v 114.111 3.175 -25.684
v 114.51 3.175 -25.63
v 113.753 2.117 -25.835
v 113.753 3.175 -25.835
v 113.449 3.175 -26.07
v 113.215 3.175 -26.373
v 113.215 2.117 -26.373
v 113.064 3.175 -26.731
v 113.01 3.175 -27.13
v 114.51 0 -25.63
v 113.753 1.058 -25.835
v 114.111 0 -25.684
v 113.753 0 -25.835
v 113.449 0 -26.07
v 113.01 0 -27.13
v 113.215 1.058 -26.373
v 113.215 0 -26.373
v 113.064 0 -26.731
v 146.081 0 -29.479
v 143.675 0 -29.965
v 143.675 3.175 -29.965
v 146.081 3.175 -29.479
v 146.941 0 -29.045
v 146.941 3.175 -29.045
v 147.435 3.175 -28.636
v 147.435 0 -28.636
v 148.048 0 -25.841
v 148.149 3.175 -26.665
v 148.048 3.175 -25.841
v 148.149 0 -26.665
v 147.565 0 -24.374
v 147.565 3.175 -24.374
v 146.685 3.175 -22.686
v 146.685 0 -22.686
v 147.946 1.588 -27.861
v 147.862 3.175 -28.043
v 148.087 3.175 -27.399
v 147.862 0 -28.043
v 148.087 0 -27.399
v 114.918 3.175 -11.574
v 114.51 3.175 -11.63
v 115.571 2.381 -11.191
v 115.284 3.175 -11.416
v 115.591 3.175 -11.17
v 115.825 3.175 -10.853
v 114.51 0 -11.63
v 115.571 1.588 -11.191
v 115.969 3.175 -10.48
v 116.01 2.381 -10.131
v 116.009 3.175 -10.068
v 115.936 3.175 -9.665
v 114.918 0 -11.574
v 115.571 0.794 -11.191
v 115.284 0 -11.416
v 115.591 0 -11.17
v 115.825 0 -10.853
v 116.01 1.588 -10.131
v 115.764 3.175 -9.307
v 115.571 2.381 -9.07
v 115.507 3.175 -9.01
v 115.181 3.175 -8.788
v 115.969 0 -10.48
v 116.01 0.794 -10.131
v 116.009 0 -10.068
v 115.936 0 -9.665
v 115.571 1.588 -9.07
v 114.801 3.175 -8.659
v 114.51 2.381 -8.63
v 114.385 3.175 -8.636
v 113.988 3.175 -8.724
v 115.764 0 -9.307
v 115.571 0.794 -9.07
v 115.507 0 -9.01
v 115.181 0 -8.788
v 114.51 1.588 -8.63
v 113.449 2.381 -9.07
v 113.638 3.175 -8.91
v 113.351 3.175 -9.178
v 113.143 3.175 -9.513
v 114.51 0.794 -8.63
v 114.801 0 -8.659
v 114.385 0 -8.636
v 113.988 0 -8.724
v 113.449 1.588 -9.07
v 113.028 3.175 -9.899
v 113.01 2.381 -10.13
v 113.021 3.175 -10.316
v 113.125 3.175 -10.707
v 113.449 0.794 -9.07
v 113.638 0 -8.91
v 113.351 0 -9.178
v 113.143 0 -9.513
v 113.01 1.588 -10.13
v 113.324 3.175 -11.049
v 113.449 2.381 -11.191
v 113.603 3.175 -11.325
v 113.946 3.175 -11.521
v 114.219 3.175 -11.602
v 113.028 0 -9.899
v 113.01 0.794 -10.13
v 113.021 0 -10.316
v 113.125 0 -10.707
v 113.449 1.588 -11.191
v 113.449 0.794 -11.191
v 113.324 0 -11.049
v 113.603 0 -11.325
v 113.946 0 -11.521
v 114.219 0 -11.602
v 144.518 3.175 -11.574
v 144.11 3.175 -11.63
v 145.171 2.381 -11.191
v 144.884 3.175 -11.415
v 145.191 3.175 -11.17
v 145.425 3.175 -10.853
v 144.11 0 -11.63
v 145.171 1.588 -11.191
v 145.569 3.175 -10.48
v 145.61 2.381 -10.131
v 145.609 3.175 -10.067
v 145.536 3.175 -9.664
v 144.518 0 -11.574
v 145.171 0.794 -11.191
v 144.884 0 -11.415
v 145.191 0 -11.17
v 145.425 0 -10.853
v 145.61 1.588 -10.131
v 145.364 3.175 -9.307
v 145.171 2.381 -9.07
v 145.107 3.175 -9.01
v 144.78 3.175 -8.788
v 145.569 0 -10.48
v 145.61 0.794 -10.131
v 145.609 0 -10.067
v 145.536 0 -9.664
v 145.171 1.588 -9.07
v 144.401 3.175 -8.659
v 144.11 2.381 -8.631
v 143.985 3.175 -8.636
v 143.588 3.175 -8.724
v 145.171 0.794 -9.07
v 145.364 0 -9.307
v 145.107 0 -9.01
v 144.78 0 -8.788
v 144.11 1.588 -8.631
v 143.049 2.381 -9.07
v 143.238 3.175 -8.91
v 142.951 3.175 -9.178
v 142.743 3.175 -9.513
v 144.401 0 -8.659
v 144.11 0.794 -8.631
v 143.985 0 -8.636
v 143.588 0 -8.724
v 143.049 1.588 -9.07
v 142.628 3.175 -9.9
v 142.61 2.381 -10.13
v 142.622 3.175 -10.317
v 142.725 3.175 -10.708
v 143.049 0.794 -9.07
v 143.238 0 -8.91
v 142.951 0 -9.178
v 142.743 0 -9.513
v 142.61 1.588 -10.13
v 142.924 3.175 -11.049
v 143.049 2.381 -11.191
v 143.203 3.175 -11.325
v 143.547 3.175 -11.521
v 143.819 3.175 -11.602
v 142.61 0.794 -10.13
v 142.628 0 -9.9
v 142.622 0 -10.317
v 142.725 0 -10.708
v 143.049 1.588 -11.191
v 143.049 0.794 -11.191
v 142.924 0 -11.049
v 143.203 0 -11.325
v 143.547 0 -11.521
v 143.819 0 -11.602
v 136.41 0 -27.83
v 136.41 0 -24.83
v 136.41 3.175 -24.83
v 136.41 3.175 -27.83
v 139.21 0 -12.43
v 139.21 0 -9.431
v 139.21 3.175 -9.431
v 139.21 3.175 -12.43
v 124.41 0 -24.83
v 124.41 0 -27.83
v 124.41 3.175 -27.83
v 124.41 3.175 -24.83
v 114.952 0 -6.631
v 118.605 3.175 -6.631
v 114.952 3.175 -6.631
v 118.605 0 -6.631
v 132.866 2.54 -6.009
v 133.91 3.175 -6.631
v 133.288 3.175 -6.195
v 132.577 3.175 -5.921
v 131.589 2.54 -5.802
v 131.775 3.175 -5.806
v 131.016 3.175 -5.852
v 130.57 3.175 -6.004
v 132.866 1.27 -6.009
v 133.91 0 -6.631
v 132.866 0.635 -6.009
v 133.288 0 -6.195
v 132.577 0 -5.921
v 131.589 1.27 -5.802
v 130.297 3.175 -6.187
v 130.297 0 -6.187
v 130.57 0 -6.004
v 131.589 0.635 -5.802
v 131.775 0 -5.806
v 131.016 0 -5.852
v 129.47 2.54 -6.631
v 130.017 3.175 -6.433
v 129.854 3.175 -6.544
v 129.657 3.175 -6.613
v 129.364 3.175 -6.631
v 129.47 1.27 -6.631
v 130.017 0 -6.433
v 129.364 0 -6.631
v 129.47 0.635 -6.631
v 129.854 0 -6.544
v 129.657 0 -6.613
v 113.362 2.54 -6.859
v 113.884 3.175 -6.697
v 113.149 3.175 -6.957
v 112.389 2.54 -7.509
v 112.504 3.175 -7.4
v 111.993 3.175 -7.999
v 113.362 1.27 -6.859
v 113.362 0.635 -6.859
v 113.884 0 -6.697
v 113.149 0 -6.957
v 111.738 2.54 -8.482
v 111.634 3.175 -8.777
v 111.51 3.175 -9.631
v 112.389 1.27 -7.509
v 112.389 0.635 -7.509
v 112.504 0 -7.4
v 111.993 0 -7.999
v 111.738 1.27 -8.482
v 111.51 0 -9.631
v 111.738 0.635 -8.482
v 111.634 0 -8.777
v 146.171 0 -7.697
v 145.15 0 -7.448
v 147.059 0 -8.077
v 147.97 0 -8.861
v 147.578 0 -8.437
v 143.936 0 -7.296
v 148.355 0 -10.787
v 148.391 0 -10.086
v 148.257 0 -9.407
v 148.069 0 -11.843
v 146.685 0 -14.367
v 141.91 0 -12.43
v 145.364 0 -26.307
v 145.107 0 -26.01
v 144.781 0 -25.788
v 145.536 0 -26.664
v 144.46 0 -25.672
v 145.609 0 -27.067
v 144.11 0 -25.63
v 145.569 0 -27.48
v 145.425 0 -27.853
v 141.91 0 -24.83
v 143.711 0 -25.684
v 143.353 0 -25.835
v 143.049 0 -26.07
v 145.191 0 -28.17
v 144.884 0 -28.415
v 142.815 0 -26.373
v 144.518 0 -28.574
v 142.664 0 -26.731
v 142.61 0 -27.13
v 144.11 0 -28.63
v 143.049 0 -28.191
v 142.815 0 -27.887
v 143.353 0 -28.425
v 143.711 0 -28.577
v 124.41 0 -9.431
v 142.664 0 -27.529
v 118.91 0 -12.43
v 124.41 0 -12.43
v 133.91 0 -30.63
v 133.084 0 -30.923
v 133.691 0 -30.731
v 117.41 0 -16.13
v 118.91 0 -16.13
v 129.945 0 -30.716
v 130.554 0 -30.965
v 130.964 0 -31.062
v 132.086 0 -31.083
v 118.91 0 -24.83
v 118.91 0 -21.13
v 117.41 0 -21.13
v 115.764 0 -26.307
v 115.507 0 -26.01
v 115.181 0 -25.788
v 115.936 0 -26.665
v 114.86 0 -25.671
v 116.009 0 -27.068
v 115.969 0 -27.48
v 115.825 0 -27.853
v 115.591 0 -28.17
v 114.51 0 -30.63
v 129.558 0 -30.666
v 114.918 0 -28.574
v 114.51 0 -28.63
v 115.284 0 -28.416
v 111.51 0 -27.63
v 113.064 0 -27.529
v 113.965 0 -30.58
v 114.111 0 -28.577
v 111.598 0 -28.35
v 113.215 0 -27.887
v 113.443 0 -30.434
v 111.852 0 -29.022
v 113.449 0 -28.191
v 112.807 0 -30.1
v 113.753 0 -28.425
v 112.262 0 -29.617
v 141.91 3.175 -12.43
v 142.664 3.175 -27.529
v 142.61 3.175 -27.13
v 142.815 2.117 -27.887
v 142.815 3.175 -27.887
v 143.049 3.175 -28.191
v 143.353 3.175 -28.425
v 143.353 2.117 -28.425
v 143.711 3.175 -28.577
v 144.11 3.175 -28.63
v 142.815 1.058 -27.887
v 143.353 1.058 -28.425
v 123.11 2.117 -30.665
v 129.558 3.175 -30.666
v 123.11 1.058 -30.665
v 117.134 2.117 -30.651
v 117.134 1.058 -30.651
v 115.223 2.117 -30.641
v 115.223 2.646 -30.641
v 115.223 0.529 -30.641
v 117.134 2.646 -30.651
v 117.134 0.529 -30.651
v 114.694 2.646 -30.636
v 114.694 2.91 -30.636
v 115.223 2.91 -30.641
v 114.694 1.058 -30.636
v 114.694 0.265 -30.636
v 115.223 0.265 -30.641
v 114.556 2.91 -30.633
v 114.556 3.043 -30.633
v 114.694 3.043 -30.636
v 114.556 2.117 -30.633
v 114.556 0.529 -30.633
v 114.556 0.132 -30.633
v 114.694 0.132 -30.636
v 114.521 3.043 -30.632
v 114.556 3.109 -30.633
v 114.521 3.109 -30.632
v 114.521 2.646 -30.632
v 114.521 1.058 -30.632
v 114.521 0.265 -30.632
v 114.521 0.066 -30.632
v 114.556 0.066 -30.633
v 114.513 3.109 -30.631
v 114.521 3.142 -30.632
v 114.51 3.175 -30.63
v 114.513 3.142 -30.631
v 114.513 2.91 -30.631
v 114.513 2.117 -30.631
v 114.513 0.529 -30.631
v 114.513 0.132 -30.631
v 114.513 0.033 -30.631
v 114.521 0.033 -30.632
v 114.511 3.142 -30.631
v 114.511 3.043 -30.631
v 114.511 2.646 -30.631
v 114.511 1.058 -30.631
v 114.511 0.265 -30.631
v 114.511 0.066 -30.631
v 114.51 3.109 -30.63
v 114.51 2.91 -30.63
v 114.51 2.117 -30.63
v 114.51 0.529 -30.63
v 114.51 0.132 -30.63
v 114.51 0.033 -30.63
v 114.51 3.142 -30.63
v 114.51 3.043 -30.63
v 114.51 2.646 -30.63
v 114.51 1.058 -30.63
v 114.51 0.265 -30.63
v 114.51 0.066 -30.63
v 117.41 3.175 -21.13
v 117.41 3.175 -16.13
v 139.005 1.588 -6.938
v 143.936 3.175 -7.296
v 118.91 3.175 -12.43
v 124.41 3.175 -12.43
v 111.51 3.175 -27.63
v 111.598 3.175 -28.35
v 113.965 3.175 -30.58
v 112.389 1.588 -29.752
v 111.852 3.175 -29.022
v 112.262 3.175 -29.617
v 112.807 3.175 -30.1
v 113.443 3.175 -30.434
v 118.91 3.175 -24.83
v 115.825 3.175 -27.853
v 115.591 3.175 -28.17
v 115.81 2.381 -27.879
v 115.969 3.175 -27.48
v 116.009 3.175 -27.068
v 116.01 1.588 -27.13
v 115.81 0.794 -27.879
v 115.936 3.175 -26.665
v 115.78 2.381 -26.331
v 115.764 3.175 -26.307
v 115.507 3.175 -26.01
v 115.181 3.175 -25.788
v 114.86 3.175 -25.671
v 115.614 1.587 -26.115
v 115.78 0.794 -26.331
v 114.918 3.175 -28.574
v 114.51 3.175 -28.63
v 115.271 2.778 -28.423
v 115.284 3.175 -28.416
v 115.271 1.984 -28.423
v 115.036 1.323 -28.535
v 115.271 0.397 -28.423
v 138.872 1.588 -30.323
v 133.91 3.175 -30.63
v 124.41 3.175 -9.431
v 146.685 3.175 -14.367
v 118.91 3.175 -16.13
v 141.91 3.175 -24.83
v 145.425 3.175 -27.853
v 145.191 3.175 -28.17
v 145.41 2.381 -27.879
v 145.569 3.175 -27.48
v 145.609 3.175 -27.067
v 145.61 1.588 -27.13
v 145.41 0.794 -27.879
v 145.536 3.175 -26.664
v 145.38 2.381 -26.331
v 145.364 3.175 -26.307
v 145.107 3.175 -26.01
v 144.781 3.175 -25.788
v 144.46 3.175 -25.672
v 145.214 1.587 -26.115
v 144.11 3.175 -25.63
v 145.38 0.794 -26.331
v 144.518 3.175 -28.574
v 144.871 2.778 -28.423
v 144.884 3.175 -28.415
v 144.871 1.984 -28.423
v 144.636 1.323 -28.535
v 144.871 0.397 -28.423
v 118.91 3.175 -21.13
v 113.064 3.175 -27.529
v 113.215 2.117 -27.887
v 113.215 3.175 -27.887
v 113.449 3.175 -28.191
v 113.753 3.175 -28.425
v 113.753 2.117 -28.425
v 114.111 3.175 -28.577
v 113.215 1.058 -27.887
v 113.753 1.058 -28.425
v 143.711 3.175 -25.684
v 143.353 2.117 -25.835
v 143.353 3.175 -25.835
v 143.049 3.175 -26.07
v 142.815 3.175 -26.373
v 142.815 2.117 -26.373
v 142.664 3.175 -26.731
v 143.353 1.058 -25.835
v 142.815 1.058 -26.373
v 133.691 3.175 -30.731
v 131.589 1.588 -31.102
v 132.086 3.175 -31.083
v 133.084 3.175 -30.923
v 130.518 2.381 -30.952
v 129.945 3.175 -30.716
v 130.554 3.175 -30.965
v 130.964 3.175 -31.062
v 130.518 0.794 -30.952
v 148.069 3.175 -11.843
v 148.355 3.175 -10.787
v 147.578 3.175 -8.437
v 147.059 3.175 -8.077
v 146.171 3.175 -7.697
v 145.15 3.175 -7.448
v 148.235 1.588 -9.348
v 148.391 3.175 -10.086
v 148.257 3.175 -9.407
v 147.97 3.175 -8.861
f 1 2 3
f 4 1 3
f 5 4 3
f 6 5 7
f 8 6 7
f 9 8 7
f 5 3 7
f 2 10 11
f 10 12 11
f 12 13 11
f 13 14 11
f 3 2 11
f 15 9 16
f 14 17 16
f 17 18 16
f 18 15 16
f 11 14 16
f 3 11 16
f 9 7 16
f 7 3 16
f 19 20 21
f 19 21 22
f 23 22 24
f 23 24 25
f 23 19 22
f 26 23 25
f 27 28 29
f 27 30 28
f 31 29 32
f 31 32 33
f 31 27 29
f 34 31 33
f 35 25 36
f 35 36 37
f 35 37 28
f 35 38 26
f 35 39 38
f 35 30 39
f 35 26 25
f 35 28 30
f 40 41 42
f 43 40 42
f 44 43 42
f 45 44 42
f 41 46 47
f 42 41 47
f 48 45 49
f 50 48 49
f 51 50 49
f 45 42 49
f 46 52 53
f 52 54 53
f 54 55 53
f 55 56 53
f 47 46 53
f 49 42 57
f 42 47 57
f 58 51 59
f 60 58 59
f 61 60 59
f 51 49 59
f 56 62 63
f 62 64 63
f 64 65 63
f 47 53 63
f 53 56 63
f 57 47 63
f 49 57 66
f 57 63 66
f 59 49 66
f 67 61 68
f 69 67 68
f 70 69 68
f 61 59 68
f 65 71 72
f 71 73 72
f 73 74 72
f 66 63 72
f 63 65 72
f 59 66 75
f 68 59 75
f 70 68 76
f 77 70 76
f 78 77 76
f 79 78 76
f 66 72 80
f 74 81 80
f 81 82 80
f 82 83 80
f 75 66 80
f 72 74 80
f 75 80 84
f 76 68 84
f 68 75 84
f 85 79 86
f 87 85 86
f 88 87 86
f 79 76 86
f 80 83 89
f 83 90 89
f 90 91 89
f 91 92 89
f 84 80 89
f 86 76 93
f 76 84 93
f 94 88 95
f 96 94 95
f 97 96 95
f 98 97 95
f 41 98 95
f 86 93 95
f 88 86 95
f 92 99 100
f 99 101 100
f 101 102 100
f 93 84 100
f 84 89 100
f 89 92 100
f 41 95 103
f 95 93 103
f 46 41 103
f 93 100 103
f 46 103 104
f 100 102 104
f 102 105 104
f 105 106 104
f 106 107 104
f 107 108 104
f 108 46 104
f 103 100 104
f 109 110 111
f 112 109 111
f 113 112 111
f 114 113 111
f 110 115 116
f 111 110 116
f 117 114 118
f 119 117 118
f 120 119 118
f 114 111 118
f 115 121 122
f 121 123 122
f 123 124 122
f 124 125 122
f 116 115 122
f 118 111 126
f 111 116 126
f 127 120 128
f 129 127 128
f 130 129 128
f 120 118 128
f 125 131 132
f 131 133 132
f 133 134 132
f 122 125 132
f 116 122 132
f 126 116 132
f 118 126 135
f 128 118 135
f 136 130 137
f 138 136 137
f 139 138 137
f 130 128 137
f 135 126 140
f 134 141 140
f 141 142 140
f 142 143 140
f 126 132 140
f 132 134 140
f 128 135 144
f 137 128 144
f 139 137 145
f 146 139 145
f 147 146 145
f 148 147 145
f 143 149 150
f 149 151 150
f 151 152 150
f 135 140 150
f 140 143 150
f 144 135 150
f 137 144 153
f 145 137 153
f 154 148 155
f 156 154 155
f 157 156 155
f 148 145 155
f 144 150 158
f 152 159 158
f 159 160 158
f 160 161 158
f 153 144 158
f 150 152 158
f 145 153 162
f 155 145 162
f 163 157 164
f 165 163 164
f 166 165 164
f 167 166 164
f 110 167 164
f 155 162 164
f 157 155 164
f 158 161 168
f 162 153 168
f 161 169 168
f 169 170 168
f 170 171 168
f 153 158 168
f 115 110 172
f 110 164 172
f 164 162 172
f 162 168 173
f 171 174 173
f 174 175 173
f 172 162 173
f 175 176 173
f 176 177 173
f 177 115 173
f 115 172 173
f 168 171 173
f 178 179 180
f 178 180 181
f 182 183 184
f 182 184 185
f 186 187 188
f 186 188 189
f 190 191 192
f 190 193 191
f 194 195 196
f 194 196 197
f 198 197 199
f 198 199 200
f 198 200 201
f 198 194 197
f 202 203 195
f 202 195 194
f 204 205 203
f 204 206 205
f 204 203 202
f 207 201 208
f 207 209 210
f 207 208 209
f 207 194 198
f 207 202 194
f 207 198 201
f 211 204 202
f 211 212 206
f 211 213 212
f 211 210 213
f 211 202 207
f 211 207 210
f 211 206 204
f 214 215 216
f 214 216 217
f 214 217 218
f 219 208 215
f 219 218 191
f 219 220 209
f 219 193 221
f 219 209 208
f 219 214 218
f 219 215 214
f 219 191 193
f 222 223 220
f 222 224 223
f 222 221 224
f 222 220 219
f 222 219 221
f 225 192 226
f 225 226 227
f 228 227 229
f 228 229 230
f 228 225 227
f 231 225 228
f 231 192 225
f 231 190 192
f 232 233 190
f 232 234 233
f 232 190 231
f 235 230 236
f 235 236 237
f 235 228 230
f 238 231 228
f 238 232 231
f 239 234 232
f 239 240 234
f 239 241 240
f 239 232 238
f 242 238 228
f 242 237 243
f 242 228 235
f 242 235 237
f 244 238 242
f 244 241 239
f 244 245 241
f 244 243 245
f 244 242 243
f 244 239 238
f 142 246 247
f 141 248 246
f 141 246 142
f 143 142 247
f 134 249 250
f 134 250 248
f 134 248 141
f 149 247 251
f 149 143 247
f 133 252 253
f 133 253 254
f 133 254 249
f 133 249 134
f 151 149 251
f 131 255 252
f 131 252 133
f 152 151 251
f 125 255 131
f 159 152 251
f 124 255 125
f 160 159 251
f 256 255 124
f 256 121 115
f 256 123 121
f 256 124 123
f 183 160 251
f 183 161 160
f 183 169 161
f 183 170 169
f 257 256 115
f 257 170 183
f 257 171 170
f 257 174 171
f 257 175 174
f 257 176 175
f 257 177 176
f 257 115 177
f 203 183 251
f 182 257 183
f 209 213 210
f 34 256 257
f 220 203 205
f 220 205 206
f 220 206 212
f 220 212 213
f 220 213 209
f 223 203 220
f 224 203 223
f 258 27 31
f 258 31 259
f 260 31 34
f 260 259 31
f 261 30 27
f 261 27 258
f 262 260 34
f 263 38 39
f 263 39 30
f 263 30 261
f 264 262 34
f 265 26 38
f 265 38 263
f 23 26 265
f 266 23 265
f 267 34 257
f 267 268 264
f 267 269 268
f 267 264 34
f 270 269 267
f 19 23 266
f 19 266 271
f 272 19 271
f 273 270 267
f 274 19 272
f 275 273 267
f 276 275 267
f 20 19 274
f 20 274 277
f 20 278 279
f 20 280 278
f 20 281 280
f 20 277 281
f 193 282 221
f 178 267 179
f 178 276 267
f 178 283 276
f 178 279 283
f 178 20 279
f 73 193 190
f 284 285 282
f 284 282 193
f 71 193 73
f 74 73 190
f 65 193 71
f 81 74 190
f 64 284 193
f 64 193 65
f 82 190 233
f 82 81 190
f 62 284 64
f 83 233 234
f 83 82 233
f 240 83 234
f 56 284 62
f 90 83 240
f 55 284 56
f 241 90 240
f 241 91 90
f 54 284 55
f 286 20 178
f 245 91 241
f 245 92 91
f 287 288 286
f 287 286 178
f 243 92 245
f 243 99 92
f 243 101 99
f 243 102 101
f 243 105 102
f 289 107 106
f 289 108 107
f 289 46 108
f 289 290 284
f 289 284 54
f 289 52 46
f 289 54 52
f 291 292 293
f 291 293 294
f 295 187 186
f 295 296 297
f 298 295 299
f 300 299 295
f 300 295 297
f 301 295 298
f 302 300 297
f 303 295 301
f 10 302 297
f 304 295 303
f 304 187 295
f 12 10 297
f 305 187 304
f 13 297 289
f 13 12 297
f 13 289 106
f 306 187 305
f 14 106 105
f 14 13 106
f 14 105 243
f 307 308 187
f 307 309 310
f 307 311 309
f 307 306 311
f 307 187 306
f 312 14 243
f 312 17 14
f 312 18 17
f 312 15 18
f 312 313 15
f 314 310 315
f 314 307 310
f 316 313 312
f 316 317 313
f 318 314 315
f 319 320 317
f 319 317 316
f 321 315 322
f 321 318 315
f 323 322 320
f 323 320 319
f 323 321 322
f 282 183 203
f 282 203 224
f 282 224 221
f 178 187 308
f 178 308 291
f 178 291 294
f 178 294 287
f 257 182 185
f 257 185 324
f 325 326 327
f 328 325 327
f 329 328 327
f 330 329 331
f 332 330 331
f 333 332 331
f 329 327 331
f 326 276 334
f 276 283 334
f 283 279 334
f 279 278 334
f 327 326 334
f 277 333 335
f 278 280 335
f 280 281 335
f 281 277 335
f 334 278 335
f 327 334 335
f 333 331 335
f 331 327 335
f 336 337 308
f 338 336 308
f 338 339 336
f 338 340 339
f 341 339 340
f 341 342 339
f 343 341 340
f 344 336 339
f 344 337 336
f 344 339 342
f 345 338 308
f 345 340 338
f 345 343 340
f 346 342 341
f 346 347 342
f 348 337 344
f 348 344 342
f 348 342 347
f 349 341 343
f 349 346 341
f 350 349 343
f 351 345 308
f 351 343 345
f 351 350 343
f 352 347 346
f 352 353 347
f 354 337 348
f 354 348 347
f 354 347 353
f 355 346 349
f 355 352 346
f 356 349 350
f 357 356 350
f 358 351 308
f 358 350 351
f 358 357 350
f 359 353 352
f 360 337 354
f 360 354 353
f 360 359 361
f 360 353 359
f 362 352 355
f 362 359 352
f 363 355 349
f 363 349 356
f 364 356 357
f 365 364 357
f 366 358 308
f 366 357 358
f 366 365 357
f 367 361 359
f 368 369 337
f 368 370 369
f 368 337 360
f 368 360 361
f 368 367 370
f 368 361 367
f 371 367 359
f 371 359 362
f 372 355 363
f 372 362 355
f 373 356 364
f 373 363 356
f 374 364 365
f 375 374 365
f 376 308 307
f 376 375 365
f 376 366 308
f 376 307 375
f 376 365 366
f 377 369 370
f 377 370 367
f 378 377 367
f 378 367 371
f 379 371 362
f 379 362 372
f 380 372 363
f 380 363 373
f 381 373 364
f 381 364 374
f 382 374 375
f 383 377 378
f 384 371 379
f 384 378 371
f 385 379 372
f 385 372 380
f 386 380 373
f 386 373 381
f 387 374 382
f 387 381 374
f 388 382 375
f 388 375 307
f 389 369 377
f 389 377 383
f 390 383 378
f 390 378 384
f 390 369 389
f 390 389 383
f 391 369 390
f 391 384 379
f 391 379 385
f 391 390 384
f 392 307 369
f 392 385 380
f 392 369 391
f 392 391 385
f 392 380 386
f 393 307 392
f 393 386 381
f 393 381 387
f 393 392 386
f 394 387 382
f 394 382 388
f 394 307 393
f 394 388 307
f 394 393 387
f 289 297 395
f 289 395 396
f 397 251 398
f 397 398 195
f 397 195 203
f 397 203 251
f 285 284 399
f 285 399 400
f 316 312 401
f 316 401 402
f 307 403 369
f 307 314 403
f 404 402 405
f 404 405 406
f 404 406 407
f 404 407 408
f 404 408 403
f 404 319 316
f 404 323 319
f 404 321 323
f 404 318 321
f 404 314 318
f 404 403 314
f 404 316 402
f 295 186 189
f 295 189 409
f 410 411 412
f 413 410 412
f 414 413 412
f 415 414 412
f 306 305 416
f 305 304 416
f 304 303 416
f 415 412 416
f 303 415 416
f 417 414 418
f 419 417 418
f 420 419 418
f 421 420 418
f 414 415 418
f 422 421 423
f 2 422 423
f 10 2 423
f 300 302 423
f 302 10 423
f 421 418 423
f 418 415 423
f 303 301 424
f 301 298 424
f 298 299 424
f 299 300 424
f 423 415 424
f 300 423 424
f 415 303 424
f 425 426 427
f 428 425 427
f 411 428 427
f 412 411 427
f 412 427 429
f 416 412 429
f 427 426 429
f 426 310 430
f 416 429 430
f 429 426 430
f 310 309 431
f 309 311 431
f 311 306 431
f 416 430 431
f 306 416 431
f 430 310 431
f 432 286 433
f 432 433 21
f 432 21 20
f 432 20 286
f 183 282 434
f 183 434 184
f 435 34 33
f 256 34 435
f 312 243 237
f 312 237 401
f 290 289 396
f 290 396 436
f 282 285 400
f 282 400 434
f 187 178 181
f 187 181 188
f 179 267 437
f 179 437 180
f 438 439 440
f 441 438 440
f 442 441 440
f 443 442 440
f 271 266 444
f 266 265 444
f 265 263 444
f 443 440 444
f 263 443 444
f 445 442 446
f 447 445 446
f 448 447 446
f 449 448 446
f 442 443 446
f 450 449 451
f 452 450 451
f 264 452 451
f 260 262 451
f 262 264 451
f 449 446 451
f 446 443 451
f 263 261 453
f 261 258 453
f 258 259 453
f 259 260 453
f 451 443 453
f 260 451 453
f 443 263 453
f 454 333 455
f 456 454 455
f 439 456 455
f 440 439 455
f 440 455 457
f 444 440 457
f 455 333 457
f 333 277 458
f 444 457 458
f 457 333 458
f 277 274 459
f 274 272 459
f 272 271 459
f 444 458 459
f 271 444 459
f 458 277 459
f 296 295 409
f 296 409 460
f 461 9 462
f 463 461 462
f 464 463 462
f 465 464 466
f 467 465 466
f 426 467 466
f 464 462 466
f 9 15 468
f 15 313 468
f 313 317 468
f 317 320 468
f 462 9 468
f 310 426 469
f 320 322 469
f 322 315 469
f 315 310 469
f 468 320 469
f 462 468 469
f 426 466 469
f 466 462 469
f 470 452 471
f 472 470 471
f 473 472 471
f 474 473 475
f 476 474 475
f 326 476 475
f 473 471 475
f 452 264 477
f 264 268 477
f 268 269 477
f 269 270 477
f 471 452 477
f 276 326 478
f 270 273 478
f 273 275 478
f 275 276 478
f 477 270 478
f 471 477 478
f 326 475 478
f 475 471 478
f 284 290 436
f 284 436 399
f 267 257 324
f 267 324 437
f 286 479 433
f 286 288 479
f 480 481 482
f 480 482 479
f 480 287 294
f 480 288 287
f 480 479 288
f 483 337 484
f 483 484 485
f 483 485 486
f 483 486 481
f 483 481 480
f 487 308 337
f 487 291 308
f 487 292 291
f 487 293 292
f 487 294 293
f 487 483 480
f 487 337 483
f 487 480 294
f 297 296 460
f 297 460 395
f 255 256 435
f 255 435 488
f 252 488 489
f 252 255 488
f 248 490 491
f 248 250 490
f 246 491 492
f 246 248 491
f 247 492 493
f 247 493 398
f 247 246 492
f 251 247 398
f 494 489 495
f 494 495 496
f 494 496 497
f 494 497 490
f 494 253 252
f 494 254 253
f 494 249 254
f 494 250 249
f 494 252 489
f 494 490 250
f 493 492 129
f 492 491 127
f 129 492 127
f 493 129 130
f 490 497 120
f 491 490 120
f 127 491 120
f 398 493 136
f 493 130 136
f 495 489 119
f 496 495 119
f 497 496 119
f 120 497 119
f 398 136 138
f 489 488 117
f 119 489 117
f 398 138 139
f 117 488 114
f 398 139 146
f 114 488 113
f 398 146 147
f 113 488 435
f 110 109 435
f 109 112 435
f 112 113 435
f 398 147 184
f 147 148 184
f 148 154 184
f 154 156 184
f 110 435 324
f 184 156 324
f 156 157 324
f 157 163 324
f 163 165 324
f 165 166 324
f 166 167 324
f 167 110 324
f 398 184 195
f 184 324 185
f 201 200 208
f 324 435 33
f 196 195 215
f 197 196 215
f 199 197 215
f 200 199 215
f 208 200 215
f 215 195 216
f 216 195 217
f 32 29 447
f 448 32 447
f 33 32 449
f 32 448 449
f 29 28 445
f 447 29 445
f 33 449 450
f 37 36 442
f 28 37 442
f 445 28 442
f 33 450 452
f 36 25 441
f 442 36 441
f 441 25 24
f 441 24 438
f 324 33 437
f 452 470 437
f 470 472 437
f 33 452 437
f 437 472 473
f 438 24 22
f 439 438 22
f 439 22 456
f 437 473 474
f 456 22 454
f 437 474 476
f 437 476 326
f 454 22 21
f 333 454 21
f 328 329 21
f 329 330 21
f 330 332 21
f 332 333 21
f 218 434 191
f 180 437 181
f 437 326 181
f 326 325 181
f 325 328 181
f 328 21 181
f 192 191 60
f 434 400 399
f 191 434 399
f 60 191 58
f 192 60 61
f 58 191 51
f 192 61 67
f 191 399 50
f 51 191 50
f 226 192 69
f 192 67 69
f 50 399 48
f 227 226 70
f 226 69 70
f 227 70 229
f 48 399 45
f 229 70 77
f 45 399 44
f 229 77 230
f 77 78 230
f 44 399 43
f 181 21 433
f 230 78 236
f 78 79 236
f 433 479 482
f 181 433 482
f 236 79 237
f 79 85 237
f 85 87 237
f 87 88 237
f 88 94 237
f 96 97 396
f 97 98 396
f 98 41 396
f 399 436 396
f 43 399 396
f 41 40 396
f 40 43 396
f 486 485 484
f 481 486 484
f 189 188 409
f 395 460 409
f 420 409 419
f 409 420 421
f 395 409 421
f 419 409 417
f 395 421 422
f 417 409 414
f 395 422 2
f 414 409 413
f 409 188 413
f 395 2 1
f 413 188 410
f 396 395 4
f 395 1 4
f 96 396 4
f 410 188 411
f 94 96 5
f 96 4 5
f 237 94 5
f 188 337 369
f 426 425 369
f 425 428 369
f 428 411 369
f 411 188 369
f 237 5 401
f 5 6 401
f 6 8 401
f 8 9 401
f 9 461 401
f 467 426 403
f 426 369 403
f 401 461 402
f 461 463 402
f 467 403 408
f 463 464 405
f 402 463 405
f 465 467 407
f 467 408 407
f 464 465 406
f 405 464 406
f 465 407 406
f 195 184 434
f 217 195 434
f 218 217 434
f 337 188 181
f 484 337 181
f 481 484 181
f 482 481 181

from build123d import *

# Parameters (mm, degrees)
BOSS_EXTRUDE1_DEPTH = 3.175


with BuildPart() as part:
    # Sketch1 → Boss-Extrude1 (new body)
    with BuildSketch(Plane(origin=(0, 0, 0), x_dir=(1, 0, 0), z_dir=(0, 1, 0))):
        with BuildLine():
            Line((111.509960584, 9.630537226), (111.509960584, 27.630337226))
            add(Edge.make_bspline(
                [(111.509960584, 27.630337226), (111.509960584, 28.425937226), (111.826160584, 29.189037226), (112.388760584, 29.751637226)],
                knots=[0.058823529, 0.058823529, 0.058823529, 0.058823529, 0.117647059, 0.117647059, 0.117647059, 0.117647059], degree=3))
            add(Edge.make_bspline(
                [(112.388760584, 29.751637226), (112.951360584, 30.314237226), (113.714360584, 30.630337226), (114.509960584, 30.630337226)],
                knots=[0.117647059, 0.117647059, 0.117647059, 0.117647059, 0.176470588, 0.176470588, 0.176470588, 0.176470588], degree=3))
            add(Edge.make_bspline(
                [(114.509960584, 30.630337226), (114.497160584, 30.650837226), (123.834160584, 30.675137226), (129.557760584, 30.665837226)],
                knots=[0.176470588, 0.176470588, 0.176470588, 0.176470588, 0.235294118, 0.235294118, 0.235294118, 0.235294118], degree=3))
            add(Edge.make_bspline(
                [(129.557760584, 30.665837226), (130.304960584, 30.664637226), (130.243960584, 31.102237226), (131.588760584, 31.102237226)],
                knots=[0.235294118, 0.235294118, 0.235294118, 0.235294118, 0.294117647, 0.294117647, 0.294117647, 0.294117647], degree=3))
            add(Edge.make_bspline(
                [(131.588760584, 31.102237226), (133.000560584, 31.102237226), (133.900960584, 30.644837226), (133.909960584, 30.630337226)],
                knots=[0.294117647, 0.294117647, 0.294117647, 0.294117647, 0.352941176, 0.352941176, 0.352941176, 0.352941176], degree=3))
            add(Edge.make_bspline(
                [(133.909960584, 30.630337226), (138.951860584, 30.347537226), (143.675260584, 29.965237226)],
                knots=[0.352941176, 0.352941176, 0.352941176, 0.411764706, 0.411764706, 0.411764706], degree=2))
            add(Edge.make_bspline(
                [(143.675260584, 29.965237226), (150.711460584, 29.395637226), (146.684560584, 22.686437226)],
                knots=[0.411764706, 0.411764706, 0.411764706, 0.470588235, 0.470588235, 0.470588235], degree=2))
            Line((146.684560584, 22.686437226), (146.684560584, 14.367137226))
            add(Edge.make_bspline(
                [(146.684560584, 14.367137226), (151.159460584, 7.865237226), (143.935660584, 7.295637226)],
                knots=[0.529411765, 0.529411765, 0.529411765, 0.588235294, 0.588235294, 0.588235294], degree=2))
            add(Edge.make_bspline(
                [(143.935660584, 7.295637226), (139.086260584, 6.913337226), (133.909960584, 6.630537226)],
                knots=[0.588235294, 0.588235294, 0.588235294, 0.647058824, 0.647058824, 0.647058824], degree=2))
            add(Edge.make_bspline(
                [(133.909960584, 6.630537226), (132.982260584, 5.801937226), (131.588760584, 5.801937226)],
                knots=[0.647058824, 0.647058824, 0.647058824, 0.705882353, 0.705882353, 0.705882353], degree=2))
            add(Edge.make_bspline(
                [(131.588760584, 5.801937226), (130.078160584, 5.801937226), (130.269860584, 6.630537226), (129.469560584, 6.630537226)],
                knots=[0.705882353, 0.705882353, 0.705882353, 0.705882353, 0.764705882, 0.764705882, 0.764705882, 0.764705882], degree=3))
            add(Edge.make_bspline(
                [(129.469560584, 6.630537226), (123.742760584, 6.630537226), (114.509960584, 6.630537226)],
                knots=[0.764705882, 0.764705882, 0.764705882, 0.823529412, 0.823529412, 0.823529412], degree=2))
            add(Edge.make_bspline(
                [(114.509960584, 6.630537226), (113.714360584, 6.630537226), (112.951360584, 6.946537226), (112.388760584, 7.509137226)],
                knots=[0.823529412, 0.823529412, 0.823529412, 0.823529412, 0.882352941, 0.882352941, 0.882352941, 0.882352941], degree=3))
            add(Edge.make_bspline(
                [(112.388760584, 7.509137226), (111.826160584, 8.071737226), (111.509960584, 8.834837226), (111.509960584, 9.630537226)],
                knots=[0.882352941, 0.882352941, 0.882352941, 0.882352941, 1, 1, 1, 1], degree=3))
        make_face()
        Polygon((117.410060584, 16.130337226), (118.909960584, 16.130337226), (118.909960584, 12.430337226), (124.409960584, 12.430337226), (124.409960584, 9.430537226), (139.209960584, 9.430537226), (139.209960584, 12.430337226), (141.909960584, 12.430337226), (141.909960584, 24.830337226), (136.409960584, 24.830337226), (136.409960584, 27.830337226), (124.409960584, 27.830337226), (124.409960584, 24.830337226), (118.909960584, 24.830337226), (118.909960584, 21.130337226), (117.410060584, 21.130337226), align=None, mode=Mode.SUBTRACT)
        with BuildLine():
            add(Edge.make_bspline(
                [(116.009960584, 27.130337226), (116.009960584, 26.301837226), (115.338460584, 25.630337226), (114.510060584, 25.630337226)],
                knots=[0, 0, 0, 0, 0.2, 0.2, 0.2, 0.2], degree=3))
            add(Edge.make_bspline(
                [(114.510060584, 25.630337226), (113.681560584, 25.630237226), (113.010060584, 26.301837226), (113.010060584, 27.130237226)],
                knots=[0.2, 0.2, 0.2, 0.2, 0.4, 0.4, 0.4, 0.4], degree=3))
            add(Edge.make_bspline(
                [(113.010060584, 27.130237226), (113.009960584, 27.958737226), (113.681560584, 28.630237226), (114.509960584, 28.630337226)],
                knots=[0.4, 0.4, 0.4, 0.4, 0.6, 0.6, 0.6, 0.6], degree=3))
            add(Edge.make_bspline(
                [(114.509960584, 28.630337226), (115.338460584, 28.630337226), (116.009960584, 27.958737226), (116.009960584, 27.130337226)],
                knots=[0.6, 0.6, 0.6, 0.6, 1, 1, 1, 1], degree=3))
        make_face(mode=Mode.SUBTRACT)
        with BuildLine():
            add(Edge.make_bspline(
                [(145.609960584, 10.130537226), (145.609960584, 9.302137226), (144.938360584, 8.630537226), (144.110060584, 8.630537226)],
                knots=[0, 0, 0, 0, 0.2, 0.2, 0.2, 0.2], degree=3))
            add(Edge.make_bspline(
                [(144.110060584, 8.630537226), (143.281660584, 8.630537226), (142.610060584, 9.302137226), (142.610060584, 10.130437226)],
                knots=[0.2, 0.2, 0.2, 0.2, 0.4, 0.4, 0.4, 0.4], degree=3))
            add(Edge.make_bspline(
                [(142.610060584, 10.130437226), (142.610060584, 10.958837226), (143.281660584, 11.630237226), (144.109960584, 11.630237226)],
                knots=[0.4, 0.4, 0.4, 0.4, 0.6, 0.6, 0.6, 0.6], degree=3))
            add(Edge.make_bspline(
                [(144.109960584, 11.630237226), (144.938360584, 11.630237226), (145.609960584, 10.958837226), (145.609960584, 10.130537226)],
                knots=[0.6, 0.6, 0.6, 0.6, 1, 1, 1, 1], degree=3))
        make_face(mode=Mode.SUBTRACT)
        with BuildLine():
            add(Edge.make_bspline(
                [(116.009960584, 10.130537226), (116.009960584, 9.302137226), (115.338360584, 8.630437226), (114.510060584, 8.630437226)],
                knots=[0, 0, 0, 0, 0.2, 0.2, 0.2, 0.2], degree=3))
            add(Edge.make_bspline(
                [(114.510060584, 8.630437226), (113.681660584, 8.630437226), (113.009960584, 9.302137226), (113.009960584, 10.130437226)],
                knots=[0.2, 0.2, 0.2, 0.2, 0.4, 0.4, 0.4, 0.4], degree=3))
            add(Edge.make_bspline(
                [(113.009960584, 10.130437226), (113.009960584, 10.958837226), (113.681660584, 11.630337226), (114.509960584, 11.630337226)],
                knots=[0.4, 0.4, 0.4, 0.4, 0.6, 0.6, 0.6, 0.6], degree=3))
            add(Edge.make_bspline(
                [(114.509960584, 11.630337226), (115.338360584, 11.630337226), (116.009960584, 10.958837226), (116.009960584, 10.130537226)],
                knots=[0.6, 0.6, 0.6, 0.6, 1, 1, 1, 1], degree=3))
        make_face(mode=Mode.SUBTRACT)
        with BuildLine():
            add(Edge.make_bspline(
                [(145.609960584, 27.130337226), (145.609960584, 26.301837226), (144.938460584, 25.630437226), (144.110060584, 25.630437226)],
                knots=[0, 0, 0, 0, 0.2, 0.2, 0.2, 0.2], degree=3))
            add(Edge.make_bspline(
                [(144.110060584, 25.630437226), (143.281560584, 25.630337226), (142.610160584, 26.301837226), (142.610160584, 27.130237226)],
                knots=[0.2, 0.2, 0.2, 0.2, 0.4, 0.4, 0.4, 0.4], degree=3))
            add(Edge.make_bspline(
                [(142.610160584, 27.130237226), (142.610060584, 27.958737226), (143.281560584, 28.630137226), (144.109960584, 28.630237226)],
                knots=[0.4, 0.4, 0.4, 0.4, 0.6, 0.6, 0.6, 0.6], degree=3))
            add(Edge.make_bspline(
                [(144.109960584, 28.630237226), (144.938460584, 28.630237226), (145.609960584, 27.958737226), (145.609960584, 27.130337226)],
                knots=[0.6, 0.6, 0.6, 0.6, 1, 1, 1, 1], degree=3))
        make_face(mode=Mode.SUBTRACT)
    extrude(amount=BOSS_EXTRUDE1_DEPTH)


solid = part.part
